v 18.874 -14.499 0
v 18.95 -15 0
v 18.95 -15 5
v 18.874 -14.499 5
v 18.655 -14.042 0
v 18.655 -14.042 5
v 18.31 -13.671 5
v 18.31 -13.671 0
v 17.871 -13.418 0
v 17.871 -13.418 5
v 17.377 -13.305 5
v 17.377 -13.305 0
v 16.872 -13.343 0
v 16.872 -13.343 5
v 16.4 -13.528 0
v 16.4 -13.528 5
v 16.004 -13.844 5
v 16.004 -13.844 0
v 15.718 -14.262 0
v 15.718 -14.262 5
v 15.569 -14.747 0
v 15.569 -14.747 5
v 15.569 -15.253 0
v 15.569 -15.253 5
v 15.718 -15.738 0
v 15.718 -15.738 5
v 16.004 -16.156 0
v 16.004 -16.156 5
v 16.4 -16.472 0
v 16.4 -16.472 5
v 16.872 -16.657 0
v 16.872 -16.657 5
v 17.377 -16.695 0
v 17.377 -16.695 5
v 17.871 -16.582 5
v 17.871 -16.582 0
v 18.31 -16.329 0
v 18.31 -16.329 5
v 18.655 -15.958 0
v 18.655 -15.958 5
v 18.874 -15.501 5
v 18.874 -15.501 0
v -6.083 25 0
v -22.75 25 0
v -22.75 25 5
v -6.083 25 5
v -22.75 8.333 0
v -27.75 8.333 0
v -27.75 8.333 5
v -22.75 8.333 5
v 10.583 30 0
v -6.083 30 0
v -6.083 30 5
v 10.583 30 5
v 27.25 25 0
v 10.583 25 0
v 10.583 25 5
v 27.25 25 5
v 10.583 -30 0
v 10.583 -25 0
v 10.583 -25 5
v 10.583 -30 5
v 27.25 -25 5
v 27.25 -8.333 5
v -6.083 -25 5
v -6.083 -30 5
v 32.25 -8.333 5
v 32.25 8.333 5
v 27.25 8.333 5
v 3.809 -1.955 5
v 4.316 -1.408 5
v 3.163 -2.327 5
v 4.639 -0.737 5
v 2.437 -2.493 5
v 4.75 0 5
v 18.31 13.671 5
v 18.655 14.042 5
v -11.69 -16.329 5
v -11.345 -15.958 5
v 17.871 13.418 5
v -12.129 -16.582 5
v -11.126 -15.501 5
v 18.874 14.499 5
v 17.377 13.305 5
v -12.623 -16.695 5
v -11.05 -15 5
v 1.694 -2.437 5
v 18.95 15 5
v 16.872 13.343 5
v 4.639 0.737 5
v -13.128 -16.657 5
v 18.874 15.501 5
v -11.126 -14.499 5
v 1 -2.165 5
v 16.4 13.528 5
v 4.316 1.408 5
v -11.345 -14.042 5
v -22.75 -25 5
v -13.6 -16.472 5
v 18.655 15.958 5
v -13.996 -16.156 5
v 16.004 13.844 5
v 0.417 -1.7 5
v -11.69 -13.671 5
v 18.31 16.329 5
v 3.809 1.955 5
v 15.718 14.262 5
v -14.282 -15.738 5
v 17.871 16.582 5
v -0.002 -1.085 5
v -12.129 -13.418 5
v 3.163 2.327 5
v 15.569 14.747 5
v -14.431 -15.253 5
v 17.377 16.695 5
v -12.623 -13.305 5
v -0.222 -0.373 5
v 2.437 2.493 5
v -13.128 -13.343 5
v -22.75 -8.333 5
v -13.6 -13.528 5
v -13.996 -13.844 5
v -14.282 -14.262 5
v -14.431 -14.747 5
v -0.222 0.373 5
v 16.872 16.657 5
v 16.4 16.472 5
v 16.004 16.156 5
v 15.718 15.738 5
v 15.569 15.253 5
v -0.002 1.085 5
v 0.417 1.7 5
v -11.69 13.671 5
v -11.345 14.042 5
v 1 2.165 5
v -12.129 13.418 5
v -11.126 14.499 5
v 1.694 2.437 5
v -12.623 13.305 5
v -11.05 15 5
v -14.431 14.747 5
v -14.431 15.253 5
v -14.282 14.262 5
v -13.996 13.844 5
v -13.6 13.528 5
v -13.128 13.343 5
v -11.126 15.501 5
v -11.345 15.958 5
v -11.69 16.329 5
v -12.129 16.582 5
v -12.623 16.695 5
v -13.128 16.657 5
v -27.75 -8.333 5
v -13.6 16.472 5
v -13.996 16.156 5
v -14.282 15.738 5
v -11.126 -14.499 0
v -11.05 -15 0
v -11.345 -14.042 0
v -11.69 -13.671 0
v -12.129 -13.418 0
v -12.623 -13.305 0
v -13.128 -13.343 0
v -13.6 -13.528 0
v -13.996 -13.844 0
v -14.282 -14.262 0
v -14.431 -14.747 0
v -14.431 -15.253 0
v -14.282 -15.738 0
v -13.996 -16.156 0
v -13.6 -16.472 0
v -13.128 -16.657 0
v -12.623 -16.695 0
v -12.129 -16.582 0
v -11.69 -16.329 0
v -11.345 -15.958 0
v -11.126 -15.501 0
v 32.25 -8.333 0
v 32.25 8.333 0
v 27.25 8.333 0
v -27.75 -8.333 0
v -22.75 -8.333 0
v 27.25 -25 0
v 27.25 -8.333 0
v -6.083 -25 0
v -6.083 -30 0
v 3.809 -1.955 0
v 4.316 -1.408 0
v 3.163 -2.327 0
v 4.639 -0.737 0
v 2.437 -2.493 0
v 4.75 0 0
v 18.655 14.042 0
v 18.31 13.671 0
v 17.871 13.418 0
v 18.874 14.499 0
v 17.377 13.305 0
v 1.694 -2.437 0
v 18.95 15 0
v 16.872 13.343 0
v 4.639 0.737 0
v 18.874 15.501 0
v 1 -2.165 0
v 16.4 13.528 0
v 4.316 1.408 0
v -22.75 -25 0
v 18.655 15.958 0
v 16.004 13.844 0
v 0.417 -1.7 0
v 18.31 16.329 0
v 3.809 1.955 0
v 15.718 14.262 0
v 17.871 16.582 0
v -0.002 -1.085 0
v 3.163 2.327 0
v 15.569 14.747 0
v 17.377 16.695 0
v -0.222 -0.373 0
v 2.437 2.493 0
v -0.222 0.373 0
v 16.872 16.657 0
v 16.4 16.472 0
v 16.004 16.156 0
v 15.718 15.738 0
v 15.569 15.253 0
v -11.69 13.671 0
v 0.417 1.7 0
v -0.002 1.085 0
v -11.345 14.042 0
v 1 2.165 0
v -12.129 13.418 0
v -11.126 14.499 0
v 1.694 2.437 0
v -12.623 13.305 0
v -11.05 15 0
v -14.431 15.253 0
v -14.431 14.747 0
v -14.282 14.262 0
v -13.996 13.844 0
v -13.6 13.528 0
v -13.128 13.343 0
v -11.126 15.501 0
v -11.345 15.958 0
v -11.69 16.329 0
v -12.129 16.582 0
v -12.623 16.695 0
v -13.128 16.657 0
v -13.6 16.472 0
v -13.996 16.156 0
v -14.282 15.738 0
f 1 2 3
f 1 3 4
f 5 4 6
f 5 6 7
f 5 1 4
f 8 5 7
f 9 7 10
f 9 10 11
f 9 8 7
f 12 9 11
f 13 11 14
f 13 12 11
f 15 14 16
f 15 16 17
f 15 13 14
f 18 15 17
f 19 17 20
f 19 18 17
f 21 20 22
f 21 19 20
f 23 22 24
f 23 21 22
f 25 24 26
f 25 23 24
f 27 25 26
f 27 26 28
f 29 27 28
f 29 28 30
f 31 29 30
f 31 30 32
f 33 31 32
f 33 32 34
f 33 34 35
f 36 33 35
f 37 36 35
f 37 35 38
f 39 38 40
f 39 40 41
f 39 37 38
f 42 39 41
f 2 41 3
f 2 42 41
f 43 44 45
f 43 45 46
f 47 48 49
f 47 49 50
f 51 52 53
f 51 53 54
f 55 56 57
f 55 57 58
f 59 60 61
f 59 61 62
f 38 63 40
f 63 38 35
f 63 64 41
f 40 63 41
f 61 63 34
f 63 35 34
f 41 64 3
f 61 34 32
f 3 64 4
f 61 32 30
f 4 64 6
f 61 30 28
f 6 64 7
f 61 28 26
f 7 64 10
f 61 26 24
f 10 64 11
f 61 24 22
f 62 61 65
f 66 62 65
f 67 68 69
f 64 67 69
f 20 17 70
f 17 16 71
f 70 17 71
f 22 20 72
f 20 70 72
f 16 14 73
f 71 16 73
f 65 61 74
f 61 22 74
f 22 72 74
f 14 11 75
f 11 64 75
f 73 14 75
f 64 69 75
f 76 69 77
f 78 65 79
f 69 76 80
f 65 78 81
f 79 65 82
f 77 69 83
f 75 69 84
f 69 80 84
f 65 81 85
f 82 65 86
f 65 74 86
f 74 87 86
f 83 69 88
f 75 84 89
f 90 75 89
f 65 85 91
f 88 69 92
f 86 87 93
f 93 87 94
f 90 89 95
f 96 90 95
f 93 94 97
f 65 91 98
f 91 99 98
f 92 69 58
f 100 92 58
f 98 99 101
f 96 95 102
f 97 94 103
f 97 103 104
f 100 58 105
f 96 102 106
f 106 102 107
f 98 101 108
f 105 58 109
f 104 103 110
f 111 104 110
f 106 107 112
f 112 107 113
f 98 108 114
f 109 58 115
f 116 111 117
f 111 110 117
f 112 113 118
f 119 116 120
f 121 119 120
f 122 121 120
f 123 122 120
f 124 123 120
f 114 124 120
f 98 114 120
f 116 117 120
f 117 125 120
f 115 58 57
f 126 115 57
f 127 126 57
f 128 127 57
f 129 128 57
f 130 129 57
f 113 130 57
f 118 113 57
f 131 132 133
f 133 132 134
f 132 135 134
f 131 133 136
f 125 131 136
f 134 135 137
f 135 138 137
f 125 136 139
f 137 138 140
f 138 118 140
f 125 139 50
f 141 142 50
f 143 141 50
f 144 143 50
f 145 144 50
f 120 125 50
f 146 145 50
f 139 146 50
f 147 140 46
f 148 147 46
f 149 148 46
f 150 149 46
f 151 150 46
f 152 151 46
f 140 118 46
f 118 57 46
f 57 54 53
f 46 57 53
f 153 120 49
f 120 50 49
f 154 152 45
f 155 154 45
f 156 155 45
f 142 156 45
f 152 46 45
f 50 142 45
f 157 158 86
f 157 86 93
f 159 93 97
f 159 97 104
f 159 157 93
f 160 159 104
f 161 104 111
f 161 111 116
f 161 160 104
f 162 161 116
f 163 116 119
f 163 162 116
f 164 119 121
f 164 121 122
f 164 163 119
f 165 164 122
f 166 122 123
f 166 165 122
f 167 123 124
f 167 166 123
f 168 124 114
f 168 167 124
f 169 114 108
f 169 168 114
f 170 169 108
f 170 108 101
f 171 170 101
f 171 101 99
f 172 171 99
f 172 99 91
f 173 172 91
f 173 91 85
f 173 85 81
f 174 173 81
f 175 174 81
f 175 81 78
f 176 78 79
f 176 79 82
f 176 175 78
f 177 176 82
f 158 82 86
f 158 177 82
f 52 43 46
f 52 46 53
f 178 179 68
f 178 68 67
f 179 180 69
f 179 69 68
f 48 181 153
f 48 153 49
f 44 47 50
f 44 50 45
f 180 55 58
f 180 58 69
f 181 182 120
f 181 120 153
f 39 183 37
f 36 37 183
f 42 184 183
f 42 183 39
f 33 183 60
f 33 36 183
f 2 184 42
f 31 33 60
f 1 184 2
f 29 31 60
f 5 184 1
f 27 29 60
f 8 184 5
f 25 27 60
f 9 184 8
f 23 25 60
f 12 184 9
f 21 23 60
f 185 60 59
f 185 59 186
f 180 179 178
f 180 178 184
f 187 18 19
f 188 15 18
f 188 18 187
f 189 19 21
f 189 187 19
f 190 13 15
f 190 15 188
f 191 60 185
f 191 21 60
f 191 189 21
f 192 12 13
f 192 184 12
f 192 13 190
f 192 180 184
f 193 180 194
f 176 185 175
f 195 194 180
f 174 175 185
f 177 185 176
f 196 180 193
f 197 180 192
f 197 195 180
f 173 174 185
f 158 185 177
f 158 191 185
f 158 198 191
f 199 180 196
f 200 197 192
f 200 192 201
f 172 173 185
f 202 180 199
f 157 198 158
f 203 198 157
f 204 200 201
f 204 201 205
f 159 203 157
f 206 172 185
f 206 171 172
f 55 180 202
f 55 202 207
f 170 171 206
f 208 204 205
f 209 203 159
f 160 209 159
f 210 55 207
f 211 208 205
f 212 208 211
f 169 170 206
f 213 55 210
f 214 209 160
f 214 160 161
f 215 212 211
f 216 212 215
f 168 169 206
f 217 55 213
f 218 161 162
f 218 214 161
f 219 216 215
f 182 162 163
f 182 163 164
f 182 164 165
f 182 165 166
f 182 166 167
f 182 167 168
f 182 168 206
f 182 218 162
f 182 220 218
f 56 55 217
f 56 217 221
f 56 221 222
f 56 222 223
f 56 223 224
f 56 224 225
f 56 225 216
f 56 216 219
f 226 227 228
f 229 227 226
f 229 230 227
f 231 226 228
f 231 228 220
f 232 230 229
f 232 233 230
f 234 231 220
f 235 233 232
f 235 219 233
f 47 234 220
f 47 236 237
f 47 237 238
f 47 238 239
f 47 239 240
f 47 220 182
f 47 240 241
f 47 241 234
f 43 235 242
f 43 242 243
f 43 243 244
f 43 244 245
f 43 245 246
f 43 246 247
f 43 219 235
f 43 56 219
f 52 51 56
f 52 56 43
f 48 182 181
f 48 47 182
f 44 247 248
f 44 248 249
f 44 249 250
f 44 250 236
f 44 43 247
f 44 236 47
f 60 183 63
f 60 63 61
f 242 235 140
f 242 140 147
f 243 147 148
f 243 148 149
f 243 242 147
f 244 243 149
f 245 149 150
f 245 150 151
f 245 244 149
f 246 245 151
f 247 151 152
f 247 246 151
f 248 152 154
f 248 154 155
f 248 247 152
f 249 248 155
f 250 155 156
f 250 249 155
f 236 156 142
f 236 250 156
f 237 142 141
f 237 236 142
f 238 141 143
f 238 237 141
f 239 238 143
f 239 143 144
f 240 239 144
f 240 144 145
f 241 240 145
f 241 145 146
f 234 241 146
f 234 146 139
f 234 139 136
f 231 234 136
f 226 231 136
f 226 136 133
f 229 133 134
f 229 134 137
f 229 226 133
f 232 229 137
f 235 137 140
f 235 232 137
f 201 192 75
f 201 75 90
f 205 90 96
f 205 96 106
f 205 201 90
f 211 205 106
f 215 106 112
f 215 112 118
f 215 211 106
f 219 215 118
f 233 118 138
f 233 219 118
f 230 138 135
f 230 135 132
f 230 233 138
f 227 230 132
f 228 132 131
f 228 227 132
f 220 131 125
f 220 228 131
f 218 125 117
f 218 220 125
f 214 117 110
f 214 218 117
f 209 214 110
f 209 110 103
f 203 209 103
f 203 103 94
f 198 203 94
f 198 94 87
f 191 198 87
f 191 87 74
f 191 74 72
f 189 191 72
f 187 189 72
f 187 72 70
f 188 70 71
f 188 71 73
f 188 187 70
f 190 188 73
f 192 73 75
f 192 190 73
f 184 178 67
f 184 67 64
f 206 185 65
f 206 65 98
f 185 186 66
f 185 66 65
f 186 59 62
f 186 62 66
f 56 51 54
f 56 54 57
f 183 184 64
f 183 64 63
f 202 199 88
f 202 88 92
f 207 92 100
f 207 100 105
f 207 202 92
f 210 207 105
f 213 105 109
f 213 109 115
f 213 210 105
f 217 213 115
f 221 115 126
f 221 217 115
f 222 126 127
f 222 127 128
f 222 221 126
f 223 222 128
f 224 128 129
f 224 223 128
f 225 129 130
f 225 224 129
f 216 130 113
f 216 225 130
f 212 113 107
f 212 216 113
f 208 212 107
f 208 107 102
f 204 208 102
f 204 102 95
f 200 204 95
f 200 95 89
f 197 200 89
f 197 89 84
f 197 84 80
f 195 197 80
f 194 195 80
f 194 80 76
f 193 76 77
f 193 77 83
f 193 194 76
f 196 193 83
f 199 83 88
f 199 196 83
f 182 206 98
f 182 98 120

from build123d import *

# Parameters (mm, degrees)
BOSS_EXTRUDE1_DEPTH = 5
CAVITY1_OUTLINE_R   = 2.5
CAVITY1_OUTLINE_R_2 = 1.7
CAVITY1_DEPTH       = 5


# Read off the part's stored shape, not the designer's step: Cavity1
with BuildPart() as part:
    # Sketch1 → Boss-Extrude1 (new body)
    with BuildSketch(Plane.XY):
        Polygon((-22.75, 8.333333333), (-22.75, 25), (-6.083333333, 25), (-6.083333333, 30), (10.583333333, 30), (10.583333333, 25), (27.25, 25), (27.25, 8.333333333), (32.25, 8.333333333), (32.25, -8.333333333), (27.25, -8.333333333), (27.25, -25), (10.583333333, -25), (10.583333333, -30), (-6.083333333, -30), (-6.083333333, -25), (-22.75, -25), (-22.75, -8.333333333), (-27.75, -8.333333333), (-27.75, 8.333333333), align=None)
    extrude(amount=BOSS_EXTRUDE1_DEPTH)

    # Cavity1 outline → Cavity1 (cut)
    with BuildSketch(Plane.XY):
        with Locations((2.25, 0)):
            Circle(CAVITY1_OUTLINE_R)
        with Locations((-12.75, 15)):
            Circle(CAVITY1_OUTLINE_R_2)
        with Locations((17.25, 15)):
            Circle(CAVITY1_OUTLINE_R_2)
        with Locations((17.25, -15)):
            Circle(CAVITY1_OUTLINE_R_2)
        with Locations((-12.75, -15)):
            Circle(CAVITY1_OUTLINE_R_2)
    extrude(amount=CAVITY1_DEPTH, mode=Mode.SUBTRACT)


solid = part.part
